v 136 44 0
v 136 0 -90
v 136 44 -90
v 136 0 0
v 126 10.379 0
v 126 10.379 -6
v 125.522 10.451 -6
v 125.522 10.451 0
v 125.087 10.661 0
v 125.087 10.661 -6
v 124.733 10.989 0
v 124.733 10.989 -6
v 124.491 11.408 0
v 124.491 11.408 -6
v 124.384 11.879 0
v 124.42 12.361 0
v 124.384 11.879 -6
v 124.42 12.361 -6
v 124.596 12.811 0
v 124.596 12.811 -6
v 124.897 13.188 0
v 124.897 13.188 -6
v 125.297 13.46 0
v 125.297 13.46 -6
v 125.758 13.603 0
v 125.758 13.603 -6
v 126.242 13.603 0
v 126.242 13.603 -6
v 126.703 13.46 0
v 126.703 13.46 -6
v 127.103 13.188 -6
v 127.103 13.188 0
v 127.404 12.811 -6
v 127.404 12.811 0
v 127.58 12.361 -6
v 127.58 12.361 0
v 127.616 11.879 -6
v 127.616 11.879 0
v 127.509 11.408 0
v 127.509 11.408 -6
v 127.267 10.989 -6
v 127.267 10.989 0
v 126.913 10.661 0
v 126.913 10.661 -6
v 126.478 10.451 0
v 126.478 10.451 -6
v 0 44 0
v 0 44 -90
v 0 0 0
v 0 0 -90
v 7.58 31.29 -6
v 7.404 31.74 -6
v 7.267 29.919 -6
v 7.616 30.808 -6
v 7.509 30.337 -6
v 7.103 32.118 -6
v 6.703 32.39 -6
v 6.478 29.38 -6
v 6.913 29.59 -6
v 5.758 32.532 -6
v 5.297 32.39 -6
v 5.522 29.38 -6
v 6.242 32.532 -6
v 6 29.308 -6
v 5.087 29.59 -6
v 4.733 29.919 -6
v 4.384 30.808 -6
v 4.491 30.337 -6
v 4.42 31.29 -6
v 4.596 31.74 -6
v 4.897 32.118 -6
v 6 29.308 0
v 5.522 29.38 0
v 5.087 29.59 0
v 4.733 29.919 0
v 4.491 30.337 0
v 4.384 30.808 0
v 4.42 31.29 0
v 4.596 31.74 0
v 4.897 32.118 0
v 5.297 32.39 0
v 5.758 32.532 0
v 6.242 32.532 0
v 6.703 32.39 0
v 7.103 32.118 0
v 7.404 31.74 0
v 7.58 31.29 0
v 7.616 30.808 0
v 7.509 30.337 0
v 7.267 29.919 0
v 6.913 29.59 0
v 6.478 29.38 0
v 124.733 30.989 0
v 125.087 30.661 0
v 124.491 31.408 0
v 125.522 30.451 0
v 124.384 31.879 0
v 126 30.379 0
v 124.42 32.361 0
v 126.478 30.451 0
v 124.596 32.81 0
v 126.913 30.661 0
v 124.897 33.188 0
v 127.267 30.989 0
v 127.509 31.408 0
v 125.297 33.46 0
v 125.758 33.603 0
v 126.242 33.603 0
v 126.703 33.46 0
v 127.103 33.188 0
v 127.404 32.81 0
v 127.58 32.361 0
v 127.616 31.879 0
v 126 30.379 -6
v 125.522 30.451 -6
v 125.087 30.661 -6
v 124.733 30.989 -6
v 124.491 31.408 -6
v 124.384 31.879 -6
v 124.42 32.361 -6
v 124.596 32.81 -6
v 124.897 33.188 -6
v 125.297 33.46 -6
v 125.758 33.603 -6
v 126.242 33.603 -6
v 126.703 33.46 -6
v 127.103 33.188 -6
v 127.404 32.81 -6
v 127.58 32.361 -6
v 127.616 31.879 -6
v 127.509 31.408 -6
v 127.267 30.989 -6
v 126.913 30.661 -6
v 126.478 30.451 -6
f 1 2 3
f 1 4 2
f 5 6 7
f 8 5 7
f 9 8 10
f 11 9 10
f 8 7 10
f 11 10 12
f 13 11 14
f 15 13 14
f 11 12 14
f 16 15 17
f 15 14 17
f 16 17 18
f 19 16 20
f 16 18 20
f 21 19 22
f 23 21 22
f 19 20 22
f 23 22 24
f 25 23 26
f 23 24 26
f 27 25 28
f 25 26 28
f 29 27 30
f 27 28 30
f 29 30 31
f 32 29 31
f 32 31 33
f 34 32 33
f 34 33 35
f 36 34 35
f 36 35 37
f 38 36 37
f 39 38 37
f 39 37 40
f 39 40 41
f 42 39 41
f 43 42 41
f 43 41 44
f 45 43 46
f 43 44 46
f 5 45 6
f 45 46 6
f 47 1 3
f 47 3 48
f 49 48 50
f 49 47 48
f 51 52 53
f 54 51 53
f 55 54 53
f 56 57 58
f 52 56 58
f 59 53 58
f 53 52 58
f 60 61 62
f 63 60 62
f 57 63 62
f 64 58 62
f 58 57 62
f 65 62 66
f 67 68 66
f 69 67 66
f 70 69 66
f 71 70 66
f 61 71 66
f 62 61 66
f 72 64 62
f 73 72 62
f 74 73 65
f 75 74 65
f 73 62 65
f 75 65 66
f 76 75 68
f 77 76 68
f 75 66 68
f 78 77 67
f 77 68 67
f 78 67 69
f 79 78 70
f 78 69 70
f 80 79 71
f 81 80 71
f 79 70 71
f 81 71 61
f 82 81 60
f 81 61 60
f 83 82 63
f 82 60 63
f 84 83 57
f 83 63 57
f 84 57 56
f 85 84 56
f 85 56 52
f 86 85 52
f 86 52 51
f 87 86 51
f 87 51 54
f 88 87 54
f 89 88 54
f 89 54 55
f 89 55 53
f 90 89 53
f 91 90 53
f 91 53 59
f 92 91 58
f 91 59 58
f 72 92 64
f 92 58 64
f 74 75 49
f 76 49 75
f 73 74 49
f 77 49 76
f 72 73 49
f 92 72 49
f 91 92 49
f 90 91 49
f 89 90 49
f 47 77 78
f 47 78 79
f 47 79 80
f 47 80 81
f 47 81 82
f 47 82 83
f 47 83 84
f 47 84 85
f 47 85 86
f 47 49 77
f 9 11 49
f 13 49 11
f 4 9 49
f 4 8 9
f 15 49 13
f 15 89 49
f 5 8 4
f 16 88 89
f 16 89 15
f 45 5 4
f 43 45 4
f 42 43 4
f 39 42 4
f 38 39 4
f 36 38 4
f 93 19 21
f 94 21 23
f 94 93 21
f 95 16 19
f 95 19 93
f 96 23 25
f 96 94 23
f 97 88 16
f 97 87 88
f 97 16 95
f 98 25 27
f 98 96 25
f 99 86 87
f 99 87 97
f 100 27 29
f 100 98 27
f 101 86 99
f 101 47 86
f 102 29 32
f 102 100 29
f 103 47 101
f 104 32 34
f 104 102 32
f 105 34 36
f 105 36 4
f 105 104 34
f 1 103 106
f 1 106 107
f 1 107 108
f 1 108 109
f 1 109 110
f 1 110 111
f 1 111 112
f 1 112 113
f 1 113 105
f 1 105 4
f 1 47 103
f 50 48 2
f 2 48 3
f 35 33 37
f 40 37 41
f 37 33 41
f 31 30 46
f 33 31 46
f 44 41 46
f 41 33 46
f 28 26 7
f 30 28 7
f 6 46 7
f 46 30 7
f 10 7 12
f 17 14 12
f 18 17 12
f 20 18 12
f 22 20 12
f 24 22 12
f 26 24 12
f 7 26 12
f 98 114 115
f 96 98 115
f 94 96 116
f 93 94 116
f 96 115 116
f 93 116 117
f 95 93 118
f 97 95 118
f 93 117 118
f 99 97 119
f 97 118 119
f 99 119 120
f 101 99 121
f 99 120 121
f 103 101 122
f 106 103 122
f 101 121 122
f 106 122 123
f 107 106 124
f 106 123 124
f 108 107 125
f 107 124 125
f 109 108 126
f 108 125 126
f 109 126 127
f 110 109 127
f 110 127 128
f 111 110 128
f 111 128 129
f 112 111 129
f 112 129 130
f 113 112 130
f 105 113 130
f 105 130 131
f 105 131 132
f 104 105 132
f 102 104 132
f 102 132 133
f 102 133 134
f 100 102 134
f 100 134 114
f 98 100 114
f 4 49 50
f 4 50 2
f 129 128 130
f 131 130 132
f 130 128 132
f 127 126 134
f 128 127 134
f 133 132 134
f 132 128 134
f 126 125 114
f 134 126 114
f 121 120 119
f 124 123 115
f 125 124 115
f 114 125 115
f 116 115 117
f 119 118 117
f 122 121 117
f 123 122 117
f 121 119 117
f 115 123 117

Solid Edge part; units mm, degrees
sketch "Sketch1" plane through (0, 0, 0) normal (0, 0, 1) x (1, 0, 0)
  line L0 (136, 44) -> (0, 44)
  line L1 (0, 44) -> (0, 0)
  line L2 (0, 0) -> (136, 0)
  line L3 (136, 0) -> (136, 44)
extrude "Protrusion1" add sketch "Sketch1" against normal blind 90
hole "Hole_1" [suppressed]
hole "Hole1" at (6, 30.9294, 0) direction (0, 0, -1) diameter 3.242 depth 6 thread major 4 thread length 2
hole "Hole2" at (126, 32, 0) direction (0, 0, -1) diameter 3.242 depth 6 thread major 4 thread length 2
hole "Hole3" at (126, 12, 0) direction (0, 0, -1) diameter 3.242 depth 6 thread major 4 thread length 2
